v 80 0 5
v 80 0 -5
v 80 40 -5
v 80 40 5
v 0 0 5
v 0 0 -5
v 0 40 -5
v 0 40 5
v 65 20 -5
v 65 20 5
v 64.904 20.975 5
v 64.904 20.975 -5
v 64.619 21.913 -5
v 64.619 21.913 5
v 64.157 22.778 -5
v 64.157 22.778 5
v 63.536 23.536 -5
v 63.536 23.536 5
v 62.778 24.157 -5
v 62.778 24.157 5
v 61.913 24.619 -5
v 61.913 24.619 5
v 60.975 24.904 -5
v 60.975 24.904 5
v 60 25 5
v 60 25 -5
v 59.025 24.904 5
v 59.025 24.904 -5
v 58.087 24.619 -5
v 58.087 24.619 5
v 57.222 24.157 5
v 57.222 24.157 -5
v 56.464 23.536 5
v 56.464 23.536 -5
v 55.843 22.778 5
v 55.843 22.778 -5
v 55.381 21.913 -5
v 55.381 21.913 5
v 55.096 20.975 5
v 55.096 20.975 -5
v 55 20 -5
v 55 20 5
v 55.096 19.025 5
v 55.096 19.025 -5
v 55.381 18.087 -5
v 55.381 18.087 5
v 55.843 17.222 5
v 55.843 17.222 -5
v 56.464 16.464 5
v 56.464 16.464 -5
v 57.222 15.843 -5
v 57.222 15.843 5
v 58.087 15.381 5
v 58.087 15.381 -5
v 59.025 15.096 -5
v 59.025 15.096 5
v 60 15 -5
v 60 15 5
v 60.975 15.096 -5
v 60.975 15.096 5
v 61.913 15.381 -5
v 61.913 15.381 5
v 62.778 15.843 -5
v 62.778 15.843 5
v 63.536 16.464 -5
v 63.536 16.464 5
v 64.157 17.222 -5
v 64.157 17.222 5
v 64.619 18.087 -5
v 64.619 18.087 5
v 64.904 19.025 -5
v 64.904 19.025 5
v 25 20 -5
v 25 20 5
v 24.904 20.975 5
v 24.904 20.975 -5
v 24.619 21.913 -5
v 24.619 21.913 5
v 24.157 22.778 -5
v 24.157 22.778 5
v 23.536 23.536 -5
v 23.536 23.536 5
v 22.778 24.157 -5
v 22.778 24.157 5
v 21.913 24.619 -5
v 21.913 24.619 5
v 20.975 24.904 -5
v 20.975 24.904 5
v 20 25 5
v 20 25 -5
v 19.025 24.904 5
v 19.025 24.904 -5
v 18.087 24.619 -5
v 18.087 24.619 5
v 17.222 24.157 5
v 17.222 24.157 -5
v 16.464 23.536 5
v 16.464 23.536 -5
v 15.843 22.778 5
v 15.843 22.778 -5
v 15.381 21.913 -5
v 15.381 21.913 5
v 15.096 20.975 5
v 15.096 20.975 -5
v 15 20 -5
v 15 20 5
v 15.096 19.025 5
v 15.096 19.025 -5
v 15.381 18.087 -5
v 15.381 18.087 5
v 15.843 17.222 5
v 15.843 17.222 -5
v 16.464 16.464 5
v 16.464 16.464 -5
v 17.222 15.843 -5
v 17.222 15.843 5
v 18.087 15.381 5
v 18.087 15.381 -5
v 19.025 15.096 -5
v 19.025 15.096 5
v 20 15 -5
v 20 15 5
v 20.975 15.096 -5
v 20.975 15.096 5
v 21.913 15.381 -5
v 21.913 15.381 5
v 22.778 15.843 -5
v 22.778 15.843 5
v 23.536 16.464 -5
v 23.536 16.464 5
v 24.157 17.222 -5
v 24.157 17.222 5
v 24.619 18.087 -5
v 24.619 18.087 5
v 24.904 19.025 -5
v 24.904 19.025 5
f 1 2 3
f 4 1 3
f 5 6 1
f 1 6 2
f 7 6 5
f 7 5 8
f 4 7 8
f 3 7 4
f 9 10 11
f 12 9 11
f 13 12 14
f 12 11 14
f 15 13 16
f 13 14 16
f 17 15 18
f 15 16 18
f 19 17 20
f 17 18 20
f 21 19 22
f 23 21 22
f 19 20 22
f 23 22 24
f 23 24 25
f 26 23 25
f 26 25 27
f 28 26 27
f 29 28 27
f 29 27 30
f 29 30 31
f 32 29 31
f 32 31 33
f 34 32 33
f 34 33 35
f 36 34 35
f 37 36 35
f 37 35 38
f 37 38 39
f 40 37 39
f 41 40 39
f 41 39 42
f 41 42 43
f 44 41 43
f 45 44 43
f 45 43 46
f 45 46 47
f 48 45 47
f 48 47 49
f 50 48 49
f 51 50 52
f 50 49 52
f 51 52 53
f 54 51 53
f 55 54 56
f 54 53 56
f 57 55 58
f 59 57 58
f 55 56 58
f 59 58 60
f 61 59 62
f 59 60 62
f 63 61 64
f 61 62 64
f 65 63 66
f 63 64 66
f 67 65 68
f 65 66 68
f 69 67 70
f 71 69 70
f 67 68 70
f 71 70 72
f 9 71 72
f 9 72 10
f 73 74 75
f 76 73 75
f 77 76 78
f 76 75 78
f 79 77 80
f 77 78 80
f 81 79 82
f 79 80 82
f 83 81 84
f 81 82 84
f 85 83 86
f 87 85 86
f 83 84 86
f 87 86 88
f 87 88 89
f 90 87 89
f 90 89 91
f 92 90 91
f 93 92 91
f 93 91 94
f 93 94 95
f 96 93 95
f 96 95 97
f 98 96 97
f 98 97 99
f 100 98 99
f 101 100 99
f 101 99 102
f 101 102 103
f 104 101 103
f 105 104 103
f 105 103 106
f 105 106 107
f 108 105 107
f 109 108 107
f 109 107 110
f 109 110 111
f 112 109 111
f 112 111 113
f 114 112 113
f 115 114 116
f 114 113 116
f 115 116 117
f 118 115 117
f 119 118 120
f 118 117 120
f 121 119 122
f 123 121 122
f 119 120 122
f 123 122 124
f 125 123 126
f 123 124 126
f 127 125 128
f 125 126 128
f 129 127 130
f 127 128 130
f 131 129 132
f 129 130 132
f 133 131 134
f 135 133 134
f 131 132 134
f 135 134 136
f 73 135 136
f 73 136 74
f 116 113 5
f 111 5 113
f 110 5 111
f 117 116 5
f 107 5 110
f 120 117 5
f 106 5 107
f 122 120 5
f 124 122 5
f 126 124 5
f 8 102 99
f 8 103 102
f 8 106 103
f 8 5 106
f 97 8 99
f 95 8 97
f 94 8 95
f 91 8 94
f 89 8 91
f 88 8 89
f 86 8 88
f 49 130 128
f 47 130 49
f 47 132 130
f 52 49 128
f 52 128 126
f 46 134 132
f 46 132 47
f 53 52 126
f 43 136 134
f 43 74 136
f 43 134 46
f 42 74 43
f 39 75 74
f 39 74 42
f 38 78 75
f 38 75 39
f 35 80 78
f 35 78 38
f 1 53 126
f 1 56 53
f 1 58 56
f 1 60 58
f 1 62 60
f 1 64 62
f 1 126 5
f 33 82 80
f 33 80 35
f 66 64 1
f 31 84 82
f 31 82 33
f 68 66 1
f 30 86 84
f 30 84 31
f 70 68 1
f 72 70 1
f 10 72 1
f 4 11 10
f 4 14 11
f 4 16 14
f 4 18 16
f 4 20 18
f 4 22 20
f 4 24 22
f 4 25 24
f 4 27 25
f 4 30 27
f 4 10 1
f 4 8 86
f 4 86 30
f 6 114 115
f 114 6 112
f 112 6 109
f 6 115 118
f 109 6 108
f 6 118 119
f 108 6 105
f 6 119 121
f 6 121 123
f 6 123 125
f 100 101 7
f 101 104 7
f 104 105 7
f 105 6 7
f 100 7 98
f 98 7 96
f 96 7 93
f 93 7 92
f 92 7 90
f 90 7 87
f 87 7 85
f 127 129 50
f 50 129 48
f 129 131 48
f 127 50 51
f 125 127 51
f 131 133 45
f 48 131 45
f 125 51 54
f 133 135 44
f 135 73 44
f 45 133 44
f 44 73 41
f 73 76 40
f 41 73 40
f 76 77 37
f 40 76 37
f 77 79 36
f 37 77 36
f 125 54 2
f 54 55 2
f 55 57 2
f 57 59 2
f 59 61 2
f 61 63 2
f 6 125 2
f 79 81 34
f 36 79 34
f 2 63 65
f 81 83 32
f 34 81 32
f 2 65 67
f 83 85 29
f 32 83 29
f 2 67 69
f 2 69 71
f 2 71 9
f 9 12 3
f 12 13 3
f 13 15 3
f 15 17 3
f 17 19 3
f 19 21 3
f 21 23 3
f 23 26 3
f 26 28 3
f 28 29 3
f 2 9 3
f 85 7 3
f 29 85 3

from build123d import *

# Parameters (mm, degrees)
SKETCH_1_W          = 80
SKETCH_1_H          = 40
EXTRUDE_1_DEPTH     = 10
SKETCH_2_R          = 5
CUT_EXTRUDE_1_DEPTH = 91


with BuildPart() as part:
    # 草图1 → 凸台-拉伸1 (new body)
    with BuildSketch(Plane.XY.offset(-5)):
        with Locations((40, 20)):
            Rectangle(SKETCH_1_W, SKETCH_1_H)
    extrude(amount=EXTRUDE_1_DEPTH)

    # 草图2 → 切除-拉伸1 (cut, through all)
    with BuildSketch(Plane.XY.offset(5)):
        with Locations((20, 20)):
            Circle(SKETCH_2_R)
        with Locations((60, 20)):
            Circle(SKETCH_2_R)
    extrude(amount=-CUT_EXTRUDE_1_DEPTH, mode=Mode.SUBTRACT)


solid = part.part
